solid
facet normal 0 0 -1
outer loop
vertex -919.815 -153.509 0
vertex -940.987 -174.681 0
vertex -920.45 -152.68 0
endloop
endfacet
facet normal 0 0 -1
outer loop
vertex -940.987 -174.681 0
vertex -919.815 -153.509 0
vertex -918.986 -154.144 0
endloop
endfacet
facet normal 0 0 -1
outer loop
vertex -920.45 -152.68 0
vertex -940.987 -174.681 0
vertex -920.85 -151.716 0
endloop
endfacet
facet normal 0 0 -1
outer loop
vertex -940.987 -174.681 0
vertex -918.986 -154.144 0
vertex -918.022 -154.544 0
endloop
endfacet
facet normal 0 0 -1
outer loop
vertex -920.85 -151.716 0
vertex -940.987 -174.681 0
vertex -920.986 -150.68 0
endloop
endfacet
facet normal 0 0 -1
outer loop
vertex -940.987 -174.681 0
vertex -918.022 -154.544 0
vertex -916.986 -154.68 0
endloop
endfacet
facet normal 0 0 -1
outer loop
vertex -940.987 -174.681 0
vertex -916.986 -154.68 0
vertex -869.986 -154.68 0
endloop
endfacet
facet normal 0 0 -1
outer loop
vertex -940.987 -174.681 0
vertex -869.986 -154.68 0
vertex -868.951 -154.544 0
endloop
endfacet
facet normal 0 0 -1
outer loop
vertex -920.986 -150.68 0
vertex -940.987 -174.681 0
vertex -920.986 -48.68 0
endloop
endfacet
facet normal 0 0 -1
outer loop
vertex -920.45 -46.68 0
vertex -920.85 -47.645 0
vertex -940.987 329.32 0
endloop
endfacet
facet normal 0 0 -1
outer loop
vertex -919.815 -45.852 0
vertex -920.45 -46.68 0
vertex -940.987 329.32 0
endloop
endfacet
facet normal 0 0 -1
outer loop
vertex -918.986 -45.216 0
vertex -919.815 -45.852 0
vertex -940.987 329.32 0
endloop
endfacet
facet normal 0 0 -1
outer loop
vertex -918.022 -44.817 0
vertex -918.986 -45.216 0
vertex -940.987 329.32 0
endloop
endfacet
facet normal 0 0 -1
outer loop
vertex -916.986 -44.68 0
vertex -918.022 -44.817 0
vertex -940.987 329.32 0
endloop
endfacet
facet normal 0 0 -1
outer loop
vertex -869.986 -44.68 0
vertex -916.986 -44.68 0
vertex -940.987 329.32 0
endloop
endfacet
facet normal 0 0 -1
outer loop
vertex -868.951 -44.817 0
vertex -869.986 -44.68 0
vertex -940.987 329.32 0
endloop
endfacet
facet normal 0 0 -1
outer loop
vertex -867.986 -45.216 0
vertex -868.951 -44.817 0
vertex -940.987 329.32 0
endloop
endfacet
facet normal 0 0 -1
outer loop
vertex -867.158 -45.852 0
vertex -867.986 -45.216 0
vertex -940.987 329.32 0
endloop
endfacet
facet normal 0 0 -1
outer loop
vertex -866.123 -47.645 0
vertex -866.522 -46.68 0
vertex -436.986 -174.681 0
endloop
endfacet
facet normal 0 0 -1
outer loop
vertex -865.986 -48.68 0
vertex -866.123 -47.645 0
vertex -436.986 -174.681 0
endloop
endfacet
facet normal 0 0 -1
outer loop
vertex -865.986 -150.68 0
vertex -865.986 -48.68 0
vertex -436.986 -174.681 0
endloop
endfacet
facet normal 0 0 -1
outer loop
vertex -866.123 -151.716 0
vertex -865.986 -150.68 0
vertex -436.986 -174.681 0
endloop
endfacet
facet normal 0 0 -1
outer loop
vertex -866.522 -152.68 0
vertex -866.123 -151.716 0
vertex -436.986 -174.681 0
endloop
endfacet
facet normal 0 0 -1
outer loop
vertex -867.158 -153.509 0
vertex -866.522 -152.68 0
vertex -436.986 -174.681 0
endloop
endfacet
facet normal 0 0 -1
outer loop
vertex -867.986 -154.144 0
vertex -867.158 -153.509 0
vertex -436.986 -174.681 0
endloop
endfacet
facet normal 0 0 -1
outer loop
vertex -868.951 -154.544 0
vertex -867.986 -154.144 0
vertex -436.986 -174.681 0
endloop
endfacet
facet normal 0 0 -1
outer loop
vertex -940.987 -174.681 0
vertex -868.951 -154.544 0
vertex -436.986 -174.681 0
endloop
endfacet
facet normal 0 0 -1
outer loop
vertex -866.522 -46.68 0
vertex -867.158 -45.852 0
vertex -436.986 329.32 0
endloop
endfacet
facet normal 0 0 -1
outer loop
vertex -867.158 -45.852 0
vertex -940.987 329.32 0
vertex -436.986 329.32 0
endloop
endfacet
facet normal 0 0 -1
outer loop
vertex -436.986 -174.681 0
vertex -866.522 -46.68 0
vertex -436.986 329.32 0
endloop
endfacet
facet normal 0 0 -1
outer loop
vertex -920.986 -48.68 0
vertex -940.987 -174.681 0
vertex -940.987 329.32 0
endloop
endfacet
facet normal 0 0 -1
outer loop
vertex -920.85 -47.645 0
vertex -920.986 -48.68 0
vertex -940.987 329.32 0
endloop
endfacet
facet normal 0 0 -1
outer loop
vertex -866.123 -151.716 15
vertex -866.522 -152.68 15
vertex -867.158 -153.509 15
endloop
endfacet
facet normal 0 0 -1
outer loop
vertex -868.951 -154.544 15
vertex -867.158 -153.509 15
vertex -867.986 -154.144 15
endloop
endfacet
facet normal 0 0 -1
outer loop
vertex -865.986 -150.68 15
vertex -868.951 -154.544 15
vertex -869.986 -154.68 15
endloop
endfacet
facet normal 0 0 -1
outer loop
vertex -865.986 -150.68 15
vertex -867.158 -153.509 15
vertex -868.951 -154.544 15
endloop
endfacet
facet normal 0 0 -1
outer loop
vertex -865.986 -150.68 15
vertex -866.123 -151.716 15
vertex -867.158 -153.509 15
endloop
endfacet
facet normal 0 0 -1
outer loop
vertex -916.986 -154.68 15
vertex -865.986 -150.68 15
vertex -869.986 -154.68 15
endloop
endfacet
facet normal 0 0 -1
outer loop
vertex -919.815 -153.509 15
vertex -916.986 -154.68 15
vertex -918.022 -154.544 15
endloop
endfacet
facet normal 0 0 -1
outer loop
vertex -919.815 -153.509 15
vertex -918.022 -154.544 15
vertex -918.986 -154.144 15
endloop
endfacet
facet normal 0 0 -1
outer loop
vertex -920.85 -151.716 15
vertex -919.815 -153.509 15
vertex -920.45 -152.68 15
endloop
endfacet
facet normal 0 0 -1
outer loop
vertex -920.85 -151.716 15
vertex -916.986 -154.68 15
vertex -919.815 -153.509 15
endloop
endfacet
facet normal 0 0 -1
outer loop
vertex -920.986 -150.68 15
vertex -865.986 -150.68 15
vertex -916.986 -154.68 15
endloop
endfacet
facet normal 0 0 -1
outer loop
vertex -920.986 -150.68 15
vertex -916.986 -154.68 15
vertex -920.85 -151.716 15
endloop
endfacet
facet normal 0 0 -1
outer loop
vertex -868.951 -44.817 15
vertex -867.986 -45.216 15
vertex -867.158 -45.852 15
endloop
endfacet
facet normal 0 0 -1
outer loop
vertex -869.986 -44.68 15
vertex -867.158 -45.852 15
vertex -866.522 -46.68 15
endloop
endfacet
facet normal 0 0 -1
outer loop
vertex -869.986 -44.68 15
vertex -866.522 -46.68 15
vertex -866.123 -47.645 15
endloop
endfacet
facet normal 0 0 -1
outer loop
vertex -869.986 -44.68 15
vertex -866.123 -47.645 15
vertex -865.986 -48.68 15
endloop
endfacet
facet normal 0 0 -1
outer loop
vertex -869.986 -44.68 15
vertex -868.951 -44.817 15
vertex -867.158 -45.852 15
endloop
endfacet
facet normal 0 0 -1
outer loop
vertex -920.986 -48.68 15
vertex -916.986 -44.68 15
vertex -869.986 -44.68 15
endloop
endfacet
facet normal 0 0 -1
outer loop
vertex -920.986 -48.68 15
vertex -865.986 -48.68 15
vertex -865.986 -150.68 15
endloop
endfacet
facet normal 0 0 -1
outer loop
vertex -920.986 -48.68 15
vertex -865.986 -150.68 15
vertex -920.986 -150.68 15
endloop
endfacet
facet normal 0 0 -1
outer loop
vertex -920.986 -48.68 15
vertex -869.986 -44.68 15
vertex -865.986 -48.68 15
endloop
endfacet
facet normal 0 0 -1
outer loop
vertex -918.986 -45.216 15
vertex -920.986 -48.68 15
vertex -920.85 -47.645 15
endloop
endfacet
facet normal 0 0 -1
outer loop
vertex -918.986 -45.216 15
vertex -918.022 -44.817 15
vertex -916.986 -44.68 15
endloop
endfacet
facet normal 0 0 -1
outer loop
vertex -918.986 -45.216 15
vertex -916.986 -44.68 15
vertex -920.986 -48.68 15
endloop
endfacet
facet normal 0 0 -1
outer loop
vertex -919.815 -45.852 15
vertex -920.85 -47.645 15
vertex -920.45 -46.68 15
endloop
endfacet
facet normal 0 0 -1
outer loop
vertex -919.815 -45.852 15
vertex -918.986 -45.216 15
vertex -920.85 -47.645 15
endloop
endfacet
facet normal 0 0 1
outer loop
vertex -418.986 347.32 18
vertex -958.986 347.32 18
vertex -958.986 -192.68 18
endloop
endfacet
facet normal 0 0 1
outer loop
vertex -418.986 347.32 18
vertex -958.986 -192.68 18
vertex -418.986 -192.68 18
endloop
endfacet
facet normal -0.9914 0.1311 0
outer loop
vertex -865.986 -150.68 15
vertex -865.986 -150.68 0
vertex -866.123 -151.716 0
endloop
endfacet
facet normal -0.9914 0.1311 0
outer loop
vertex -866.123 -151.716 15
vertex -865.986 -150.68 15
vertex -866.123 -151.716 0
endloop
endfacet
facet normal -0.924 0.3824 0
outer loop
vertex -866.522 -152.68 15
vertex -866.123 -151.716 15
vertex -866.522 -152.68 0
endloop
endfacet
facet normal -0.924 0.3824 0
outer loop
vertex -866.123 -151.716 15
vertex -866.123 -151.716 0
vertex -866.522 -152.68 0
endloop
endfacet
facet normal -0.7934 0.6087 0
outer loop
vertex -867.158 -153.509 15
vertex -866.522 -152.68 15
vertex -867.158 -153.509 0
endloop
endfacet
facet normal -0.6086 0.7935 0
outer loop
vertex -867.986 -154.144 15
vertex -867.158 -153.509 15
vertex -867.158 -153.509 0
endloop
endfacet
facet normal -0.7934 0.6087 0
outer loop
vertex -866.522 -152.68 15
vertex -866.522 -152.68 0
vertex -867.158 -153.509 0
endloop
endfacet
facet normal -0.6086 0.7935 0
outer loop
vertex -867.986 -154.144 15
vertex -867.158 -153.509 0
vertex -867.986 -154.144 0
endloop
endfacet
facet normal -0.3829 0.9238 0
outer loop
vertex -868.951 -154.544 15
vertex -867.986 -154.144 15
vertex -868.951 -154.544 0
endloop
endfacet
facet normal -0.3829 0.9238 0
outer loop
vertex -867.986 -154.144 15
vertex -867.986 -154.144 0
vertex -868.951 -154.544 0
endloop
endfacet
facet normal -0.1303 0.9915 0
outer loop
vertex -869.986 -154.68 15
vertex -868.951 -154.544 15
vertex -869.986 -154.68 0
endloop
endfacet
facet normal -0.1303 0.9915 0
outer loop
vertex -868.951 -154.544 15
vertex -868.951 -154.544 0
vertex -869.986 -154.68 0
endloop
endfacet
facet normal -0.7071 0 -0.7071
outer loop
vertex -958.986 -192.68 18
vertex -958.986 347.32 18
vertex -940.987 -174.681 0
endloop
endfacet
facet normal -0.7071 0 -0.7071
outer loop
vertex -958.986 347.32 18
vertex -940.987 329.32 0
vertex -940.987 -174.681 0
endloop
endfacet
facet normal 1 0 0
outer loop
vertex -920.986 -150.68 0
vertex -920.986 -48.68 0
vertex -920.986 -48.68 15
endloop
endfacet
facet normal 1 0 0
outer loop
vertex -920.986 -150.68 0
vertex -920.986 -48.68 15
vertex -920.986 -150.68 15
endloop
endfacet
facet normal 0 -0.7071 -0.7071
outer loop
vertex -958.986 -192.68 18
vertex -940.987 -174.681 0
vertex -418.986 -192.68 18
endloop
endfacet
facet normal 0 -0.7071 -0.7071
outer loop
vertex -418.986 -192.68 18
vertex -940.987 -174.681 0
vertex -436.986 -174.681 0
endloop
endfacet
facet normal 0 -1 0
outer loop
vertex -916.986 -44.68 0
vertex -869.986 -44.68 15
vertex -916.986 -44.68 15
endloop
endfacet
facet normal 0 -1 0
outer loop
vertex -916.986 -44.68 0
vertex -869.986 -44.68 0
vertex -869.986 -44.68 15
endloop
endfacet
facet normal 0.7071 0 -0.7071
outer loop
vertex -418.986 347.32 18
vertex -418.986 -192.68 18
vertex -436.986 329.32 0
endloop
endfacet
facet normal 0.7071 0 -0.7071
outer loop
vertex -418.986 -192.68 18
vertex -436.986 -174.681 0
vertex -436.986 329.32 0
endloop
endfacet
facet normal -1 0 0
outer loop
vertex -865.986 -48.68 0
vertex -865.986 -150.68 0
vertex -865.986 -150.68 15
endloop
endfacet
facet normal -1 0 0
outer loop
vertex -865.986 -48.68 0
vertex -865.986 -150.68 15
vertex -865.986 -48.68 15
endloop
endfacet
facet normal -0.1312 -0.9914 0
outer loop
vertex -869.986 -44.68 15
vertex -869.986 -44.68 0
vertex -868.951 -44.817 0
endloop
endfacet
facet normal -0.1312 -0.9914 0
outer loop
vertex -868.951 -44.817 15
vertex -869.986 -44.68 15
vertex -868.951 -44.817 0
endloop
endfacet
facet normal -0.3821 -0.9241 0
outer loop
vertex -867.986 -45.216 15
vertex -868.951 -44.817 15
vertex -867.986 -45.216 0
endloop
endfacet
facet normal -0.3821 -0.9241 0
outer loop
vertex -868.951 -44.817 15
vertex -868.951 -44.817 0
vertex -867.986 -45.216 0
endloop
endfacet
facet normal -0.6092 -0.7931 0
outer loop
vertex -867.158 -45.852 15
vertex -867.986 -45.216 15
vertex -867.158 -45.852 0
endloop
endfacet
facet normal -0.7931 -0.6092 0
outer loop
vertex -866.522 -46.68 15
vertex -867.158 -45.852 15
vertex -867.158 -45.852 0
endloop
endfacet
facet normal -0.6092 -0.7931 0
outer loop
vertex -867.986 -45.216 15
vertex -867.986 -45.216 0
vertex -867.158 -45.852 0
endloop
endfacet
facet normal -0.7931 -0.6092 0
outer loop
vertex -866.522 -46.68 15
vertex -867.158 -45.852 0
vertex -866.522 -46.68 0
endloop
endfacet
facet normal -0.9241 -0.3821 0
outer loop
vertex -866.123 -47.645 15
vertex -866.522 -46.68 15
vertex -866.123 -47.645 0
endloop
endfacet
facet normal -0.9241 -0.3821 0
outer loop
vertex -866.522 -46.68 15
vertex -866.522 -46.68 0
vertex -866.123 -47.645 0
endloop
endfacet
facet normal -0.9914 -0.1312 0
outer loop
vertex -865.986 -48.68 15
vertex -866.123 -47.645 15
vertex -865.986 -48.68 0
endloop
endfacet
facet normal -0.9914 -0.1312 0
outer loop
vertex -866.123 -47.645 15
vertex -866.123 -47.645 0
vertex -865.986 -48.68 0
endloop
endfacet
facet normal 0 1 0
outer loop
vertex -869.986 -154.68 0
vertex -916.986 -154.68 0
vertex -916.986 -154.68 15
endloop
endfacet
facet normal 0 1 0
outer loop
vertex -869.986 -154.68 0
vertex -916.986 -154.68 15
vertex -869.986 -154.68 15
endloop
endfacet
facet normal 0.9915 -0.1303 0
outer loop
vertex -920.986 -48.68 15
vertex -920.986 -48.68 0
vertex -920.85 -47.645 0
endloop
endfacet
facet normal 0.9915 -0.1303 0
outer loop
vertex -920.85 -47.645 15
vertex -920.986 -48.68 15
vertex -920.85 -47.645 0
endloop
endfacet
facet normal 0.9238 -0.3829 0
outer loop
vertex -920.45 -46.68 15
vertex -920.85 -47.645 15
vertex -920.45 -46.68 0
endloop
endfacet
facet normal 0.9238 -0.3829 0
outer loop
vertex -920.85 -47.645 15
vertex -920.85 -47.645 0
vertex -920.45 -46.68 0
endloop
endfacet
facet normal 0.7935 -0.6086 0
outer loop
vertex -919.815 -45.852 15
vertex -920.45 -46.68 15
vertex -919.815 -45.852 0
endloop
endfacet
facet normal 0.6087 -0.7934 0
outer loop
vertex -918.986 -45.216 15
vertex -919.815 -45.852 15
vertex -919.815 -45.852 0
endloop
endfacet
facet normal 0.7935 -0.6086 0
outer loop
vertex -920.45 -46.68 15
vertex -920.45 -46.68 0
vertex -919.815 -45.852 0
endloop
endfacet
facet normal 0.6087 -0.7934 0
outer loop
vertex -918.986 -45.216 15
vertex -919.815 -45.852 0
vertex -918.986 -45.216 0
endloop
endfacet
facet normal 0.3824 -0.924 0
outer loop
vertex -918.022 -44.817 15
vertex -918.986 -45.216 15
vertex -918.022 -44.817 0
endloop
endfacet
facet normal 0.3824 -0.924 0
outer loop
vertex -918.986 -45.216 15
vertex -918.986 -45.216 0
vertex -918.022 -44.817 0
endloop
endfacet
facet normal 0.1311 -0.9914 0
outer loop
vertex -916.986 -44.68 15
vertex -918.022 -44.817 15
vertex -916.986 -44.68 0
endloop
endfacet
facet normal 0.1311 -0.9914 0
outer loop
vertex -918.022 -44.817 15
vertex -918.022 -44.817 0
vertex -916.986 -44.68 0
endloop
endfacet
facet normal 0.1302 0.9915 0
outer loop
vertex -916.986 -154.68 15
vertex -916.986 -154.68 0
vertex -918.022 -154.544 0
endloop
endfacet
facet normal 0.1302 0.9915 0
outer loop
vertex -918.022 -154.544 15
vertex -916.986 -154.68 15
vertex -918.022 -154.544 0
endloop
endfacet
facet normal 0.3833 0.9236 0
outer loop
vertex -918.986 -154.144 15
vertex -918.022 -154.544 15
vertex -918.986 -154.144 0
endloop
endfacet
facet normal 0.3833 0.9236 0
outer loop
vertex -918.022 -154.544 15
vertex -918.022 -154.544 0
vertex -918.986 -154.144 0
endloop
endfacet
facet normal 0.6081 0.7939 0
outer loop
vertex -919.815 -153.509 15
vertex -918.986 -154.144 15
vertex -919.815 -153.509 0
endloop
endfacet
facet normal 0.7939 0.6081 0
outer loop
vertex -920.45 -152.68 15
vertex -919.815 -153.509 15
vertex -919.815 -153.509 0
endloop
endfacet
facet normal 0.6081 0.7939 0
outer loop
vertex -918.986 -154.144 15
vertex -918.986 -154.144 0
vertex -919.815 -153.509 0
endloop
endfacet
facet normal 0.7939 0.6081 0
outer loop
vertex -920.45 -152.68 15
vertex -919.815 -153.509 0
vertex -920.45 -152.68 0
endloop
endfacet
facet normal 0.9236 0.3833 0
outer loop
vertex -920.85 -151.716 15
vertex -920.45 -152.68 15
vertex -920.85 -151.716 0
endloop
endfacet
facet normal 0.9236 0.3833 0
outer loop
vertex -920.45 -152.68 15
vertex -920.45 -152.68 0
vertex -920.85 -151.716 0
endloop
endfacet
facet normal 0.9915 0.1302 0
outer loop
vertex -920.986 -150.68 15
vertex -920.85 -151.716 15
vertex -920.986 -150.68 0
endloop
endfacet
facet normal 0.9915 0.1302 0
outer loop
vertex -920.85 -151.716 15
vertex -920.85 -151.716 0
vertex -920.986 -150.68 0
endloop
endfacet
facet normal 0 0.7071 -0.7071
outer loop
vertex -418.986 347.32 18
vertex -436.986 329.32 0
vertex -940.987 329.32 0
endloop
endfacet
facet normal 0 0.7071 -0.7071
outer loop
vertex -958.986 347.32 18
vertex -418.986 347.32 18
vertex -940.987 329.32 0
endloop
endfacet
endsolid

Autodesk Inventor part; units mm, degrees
ref_plane "YZ Plane" through (0, 0, 0) normal (1, 0, 0) x (0, 1, 0)
ref_plane "XZ Plane" through (0, 0, 0) normal (0, 1, 0) x (-1, 0, 0)
ref_plane "XY Plane" through (0, 0, 0) normal (0, 0, 1) x (1, 0, 0)
ref_plane "Arbeitsebene1" through (-858.9244, 0, 0) normal (0, 0, 1) x (1, 0, 0)
sketch "Skizze2" plane through (-858.9244, 0, 0) normal (0, 0, 1) x (1, 0, 0)
  line L0 (-100.0619, 347.3197) -> (439.9381, 347.3197)
  line L1 (439.9381, 347.3197) -> (439.9381, -192.6803)
  line L2 (439.9381, -192.6803) -> (-100.0619, -192.6803)
  line L3 (-100.0619, -192.6803) -> (-100.0619, 347.3197)
  point P0 (858.9244, 0)
  dimension "d5" = 540
  dimension "d6" = 540
extrude "Extrusion2" add sketch "Skizze2" along normal blind 18
chamfer "Fase2" distance 18 angle 45 4 edges at (-688.9863, -192.6803, 0) (-418.9863, 77.3197, 0) (-958.9863, 77.3197, 0) (-688.9863, 347.3197, 0)
sketch "Skizze3" plane through (-858.9244, 0, 0) normal (0, 0, -1) x (-1, 0, 0)
  line L0 (58.0619, -154.6803) -> (11.0619, -154.6803)
  line L1 (7.0619, -150.6803) -> (7.0619, -48.6803)
  line L2 (11.0619, -44.6803) -> (58.0619, -44.6803)
  line L3 (62.0619, -48.6803) -> (62.0619, -150.6803)
  line L4 (82.0619, -174.6803) -> (-421.9381, -174.6803) projected
  line L5 (82.0619, 329.3197) -> (82.0619, -174.6803) projected
  arc A0 (58.0619, -154.6803) -> (62.0619, -150.6803) centre (58.0619, -150.6803) ccw
  arc A1 (7.0619, -150.6803) -> (11.0619, -154.6803) centre (11.0619, -150.6803) ccw
  arc A2 (11.0619, -44.6803) -> (7.0619, -48.6803) centre (11.0619, -48.6803) ccw
  arc A3 (62.0619, -48.6803) -> (58.0619, -44.6803) centre (58.0619, -48.6803) ccw
  point P0 (-858.9244, 0)
  point P1 (7.0619, -44.6803)
  point P2 (7.0619, -154.6803)
  point P3 (62.0619, -44.6803)
  dimension "d12" = 55
  dimension "d13" = 110
  dimension "d14" = 20
  dimension "d15" = 20
  dimension "d16" = 4
extrude "Extrusion3" cut sketch "Skizze3" against normal blind 15
properties part number "Sitzfläche"
